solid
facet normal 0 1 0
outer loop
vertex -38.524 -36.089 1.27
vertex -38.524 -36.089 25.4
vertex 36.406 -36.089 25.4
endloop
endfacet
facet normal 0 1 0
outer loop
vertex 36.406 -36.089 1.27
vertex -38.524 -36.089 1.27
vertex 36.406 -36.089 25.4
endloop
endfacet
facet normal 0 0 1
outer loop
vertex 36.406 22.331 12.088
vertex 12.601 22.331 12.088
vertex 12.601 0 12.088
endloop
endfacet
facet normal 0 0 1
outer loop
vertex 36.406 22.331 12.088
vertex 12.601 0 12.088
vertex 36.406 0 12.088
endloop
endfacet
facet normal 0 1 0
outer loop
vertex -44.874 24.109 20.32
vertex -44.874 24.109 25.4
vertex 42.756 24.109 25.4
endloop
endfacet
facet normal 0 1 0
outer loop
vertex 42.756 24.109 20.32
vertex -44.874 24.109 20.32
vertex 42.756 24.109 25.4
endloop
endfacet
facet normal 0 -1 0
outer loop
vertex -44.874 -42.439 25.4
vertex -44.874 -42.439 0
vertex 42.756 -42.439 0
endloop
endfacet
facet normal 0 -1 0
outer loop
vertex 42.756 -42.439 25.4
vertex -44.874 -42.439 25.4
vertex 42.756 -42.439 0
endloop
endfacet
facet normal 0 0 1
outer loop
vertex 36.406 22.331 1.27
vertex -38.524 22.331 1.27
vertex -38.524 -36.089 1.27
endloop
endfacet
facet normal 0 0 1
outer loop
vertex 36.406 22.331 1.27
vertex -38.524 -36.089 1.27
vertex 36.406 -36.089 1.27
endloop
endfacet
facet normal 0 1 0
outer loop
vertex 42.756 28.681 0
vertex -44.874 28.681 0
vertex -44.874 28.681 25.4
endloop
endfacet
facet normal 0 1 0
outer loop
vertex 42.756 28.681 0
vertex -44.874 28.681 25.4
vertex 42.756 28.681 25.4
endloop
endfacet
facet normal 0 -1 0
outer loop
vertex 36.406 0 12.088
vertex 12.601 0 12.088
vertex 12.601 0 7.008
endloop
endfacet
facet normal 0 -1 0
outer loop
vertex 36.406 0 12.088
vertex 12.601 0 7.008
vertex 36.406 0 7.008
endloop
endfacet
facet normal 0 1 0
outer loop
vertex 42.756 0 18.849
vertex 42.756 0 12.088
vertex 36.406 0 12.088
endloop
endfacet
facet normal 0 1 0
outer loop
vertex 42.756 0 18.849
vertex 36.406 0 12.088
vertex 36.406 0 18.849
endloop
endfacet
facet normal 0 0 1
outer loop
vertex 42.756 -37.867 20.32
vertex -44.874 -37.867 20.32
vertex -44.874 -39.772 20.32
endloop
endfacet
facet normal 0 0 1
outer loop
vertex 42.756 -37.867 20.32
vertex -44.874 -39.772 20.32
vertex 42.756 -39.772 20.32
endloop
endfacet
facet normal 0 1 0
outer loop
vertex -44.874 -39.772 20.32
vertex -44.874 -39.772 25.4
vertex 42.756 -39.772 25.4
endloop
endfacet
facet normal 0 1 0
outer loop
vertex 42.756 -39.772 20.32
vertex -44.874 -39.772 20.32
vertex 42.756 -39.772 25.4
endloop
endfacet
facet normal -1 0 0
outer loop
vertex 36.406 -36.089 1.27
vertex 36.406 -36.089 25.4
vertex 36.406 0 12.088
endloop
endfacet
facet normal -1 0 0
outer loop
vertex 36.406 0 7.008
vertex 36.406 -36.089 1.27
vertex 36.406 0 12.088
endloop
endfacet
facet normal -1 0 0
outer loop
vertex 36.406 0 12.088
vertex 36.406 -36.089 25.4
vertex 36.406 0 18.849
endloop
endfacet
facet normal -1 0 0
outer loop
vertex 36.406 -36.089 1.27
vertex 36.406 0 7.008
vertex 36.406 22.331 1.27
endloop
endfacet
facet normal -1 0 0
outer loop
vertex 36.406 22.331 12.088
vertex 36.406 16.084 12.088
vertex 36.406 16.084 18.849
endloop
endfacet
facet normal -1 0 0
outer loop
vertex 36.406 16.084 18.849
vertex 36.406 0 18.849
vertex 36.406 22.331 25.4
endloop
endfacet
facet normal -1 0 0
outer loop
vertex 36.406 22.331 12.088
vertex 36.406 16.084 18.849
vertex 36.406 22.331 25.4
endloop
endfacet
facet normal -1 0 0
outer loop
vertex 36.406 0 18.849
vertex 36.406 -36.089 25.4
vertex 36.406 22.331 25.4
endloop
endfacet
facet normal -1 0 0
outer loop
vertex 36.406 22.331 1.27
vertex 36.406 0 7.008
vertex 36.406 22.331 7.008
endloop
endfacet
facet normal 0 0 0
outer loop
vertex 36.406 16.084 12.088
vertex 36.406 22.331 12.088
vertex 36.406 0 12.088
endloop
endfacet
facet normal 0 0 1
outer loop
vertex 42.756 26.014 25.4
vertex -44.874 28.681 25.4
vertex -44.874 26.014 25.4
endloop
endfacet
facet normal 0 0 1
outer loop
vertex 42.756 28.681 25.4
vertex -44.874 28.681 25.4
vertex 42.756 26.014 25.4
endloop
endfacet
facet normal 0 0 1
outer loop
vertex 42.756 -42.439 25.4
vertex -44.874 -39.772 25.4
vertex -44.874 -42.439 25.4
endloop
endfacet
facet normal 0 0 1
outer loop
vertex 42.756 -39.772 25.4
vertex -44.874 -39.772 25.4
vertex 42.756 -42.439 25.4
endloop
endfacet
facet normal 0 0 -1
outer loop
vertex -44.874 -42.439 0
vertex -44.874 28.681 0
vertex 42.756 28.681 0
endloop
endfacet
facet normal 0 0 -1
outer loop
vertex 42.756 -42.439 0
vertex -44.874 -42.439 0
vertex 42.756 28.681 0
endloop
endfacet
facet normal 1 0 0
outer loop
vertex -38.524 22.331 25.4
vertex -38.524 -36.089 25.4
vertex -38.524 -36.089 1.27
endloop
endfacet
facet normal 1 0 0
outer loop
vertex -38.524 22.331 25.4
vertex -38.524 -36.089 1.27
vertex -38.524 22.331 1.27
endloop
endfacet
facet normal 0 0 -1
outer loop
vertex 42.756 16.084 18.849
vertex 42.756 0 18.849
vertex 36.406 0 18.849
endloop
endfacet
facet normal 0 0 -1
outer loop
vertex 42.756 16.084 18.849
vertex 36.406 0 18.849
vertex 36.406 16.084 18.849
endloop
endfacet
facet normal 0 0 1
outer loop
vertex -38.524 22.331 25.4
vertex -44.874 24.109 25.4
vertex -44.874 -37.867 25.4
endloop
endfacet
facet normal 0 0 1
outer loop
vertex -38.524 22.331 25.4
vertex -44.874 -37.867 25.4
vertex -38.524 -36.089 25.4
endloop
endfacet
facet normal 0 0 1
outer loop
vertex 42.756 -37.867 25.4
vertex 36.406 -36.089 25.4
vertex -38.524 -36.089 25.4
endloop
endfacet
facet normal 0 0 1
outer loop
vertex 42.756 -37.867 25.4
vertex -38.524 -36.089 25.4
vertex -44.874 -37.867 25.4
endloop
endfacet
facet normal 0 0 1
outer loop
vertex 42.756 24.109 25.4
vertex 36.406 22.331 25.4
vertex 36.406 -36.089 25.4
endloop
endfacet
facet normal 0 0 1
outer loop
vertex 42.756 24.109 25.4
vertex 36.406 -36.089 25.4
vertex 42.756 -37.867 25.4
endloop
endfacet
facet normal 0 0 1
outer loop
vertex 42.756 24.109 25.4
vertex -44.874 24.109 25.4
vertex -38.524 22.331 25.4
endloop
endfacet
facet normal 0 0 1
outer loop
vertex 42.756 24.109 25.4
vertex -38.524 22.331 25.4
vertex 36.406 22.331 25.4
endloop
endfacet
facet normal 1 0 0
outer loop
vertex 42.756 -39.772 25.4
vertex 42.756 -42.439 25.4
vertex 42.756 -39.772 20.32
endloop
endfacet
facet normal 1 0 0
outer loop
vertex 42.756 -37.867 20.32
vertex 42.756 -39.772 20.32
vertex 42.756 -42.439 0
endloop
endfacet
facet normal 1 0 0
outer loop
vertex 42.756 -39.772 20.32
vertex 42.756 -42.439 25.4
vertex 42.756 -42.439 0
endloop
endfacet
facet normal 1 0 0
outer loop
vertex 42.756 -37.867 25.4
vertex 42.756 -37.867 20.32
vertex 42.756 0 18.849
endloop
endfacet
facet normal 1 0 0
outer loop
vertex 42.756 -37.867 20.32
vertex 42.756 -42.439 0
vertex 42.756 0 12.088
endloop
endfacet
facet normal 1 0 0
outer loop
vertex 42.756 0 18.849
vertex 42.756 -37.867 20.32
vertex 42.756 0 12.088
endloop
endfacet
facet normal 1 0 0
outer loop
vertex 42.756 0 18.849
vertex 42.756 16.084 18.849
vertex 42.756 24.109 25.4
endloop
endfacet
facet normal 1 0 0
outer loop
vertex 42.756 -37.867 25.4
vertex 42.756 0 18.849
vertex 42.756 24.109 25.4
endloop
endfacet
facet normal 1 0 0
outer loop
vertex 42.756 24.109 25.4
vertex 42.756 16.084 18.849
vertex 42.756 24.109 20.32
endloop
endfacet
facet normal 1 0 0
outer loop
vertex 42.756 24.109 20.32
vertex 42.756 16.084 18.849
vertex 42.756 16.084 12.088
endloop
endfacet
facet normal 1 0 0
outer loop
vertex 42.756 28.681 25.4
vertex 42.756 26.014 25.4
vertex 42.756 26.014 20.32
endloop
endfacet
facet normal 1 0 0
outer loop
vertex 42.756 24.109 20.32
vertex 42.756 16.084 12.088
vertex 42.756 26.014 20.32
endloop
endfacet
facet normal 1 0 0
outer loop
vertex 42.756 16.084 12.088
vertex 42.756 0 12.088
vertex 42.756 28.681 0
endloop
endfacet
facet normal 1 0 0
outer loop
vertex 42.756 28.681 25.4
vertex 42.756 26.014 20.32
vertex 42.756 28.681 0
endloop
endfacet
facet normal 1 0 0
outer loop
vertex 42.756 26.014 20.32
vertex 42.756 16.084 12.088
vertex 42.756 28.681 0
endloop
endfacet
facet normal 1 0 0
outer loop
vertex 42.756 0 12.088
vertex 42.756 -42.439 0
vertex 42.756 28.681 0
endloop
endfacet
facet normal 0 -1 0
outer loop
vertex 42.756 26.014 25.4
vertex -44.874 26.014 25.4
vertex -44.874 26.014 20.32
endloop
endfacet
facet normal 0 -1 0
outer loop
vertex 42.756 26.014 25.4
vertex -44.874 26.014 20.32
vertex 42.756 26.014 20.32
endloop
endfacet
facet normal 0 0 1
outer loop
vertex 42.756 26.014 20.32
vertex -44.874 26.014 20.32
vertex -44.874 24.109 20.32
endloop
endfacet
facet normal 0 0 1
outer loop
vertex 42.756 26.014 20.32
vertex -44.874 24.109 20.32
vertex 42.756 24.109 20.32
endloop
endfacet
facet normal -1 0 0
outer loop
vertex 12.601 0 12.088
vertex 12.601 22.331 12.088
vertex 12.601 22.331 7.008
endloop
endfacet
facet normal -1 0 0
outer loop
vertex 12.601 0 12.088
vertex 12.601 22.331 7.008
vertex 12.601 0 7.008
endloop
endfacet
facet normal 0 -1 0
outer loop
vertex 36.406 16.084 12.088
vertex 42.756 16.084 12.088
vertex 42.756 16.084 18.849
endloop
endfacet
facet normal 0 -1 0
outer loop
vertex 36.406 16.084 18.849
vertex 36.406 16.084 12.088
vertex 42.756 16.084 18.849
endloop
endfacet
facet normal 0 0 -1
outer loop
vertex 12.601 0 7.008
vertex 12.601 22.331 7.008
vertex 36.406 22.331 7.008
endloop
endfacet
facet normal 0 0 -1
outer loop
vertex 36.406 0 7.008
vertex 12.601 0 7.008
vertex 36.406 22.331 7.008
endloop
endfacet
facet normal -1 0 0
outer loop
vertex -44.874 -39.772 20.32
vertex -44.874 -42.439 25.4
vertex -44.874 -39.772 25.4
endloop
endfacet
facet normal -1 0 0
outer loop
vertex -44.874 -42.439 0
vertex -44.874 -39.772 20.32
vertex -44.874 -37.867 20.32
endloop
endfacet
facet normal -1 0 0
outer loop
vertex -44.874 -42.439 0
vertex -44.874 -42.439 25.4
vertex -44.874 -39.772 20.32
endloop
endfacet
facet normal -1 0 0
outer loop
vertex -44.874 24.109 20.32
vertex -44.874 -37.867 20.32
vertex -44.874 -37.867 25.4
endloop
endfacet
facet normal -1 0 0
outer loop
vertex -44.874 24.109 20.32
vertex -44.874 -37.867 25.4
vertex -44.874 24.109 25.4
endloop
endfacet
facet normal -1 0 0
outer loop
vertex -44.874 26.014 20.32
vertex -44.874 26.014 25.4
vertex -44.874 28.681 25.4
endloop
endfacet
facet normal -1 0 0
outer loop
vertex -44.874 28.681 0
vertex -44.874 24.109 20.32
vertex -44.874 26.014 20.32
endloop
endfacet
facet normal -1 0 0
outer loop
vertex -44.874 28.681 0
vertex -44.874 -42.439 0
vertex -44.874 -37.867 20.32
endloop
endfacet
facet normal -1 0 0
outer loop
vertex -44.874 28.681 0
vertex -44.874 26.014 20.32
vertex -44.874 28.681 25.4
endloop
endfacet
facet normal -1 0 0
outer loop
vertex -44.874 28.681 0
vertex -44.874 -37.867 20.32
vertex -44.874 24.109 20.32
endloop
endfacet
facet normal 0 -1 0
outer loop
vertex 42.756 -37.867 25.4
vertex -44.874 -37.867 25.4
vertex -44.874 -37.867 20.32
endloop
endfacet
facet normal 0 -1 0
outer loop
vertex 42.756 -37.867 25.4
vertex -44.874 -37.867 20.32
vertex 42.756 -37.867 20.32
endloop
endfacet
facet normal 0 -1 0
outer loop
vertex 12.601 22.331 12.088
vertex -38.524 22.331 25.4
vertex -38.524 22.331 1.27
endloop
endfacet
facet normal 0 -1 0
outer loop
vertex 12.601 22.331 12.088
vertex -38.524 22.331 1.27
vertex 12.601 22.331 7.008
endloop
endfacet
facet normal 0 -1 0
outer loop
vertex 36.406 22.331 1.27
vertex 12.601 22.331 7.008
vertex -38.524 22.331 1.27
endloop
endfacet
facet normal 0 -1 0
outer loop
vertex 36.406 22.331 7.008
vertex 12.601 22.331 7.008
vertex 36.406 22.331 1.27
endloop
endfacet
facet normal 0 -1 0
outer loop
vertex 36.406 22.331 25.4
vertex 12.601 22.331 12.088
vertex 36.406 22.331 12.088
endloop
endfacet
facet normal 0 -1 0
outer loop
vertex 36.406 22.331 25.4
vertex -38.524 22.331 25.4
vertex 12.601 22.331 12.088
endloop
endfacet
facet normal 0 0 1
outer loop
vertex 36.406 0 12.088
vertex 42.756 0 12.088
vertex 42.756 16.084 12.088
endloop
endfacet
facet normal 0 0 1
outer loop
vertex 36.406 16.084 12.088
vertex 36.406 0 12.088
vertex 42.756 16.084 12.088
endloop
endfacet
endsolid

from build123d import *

# Parameters (mm, degrees)
F0_W     = 87.63
F0_H     = 71.12
F1_DEPTH = 25.4
F2_W     = 74.929997
F2_H     = 58.42
F3_DEPTH = 24.13
F4_W     = 16.083958
F4_H     = 6.761409
F5_DEPTH = 7.62
F6_W     = 87.63
F6_H     = 1.905
F7_DEPTH = 5.08
F9_DEPTH = 5.08


with BuildPart() as f1:
    # F0 (on Top) → F1 (new body)
    with BuildSketch(Plane.XY):
        with Locations((-1.058847, -6.879137)):
            Rectangle(F0_W, F0_H)
    extrude(amount=F1_DEPTH)

    # F2 (on face) → F3 (cut)
    with BuildSketch(Plane.XY.offset(25.4)):
        with Locations((-1.058847, -6.879137)):
            Rectangle(F2_W, F2_H)
    extrude(amount=-F3_DEPTH, mode=Mode.SUBTRACT)

    # F4 (on face) → F5 (cut)
    with BuildSketch(Plane.YZ.offset(42.756153)):
        with Locations((8.041979, 15.468483)):
            Rectangle(F4_W, F4_H)
    extrude(amount=-F5_DEPTH, mode=Mode.SUBTRACT)

    # F6 (on face) → F7 (cut)
    with BuildSketch(Plane.XY.offset(25.4)):
        with Locations((-1.058847, 25.061363)):
            Rectangle(F6_W, F6_H)
        with Locations((-1.058847, -38.819637)):
            Rectangle(F6_W, F6_H)
    extrude(amount=-F7_DEPTH, mode=Mode.SUBTRACT)

    # F8 (on face) → F9 (join)
    with BuildSketch(Plane.XY.offset(12.087778)):
        Polygon((12.600807, 0), (36.406152, 0), (36.406152, 16.083958), (36.406152, 22.332337), (12.600807, 22.332337), align=None)
    extrude(amount=-F9_DEPTH)


solid = f1.part
